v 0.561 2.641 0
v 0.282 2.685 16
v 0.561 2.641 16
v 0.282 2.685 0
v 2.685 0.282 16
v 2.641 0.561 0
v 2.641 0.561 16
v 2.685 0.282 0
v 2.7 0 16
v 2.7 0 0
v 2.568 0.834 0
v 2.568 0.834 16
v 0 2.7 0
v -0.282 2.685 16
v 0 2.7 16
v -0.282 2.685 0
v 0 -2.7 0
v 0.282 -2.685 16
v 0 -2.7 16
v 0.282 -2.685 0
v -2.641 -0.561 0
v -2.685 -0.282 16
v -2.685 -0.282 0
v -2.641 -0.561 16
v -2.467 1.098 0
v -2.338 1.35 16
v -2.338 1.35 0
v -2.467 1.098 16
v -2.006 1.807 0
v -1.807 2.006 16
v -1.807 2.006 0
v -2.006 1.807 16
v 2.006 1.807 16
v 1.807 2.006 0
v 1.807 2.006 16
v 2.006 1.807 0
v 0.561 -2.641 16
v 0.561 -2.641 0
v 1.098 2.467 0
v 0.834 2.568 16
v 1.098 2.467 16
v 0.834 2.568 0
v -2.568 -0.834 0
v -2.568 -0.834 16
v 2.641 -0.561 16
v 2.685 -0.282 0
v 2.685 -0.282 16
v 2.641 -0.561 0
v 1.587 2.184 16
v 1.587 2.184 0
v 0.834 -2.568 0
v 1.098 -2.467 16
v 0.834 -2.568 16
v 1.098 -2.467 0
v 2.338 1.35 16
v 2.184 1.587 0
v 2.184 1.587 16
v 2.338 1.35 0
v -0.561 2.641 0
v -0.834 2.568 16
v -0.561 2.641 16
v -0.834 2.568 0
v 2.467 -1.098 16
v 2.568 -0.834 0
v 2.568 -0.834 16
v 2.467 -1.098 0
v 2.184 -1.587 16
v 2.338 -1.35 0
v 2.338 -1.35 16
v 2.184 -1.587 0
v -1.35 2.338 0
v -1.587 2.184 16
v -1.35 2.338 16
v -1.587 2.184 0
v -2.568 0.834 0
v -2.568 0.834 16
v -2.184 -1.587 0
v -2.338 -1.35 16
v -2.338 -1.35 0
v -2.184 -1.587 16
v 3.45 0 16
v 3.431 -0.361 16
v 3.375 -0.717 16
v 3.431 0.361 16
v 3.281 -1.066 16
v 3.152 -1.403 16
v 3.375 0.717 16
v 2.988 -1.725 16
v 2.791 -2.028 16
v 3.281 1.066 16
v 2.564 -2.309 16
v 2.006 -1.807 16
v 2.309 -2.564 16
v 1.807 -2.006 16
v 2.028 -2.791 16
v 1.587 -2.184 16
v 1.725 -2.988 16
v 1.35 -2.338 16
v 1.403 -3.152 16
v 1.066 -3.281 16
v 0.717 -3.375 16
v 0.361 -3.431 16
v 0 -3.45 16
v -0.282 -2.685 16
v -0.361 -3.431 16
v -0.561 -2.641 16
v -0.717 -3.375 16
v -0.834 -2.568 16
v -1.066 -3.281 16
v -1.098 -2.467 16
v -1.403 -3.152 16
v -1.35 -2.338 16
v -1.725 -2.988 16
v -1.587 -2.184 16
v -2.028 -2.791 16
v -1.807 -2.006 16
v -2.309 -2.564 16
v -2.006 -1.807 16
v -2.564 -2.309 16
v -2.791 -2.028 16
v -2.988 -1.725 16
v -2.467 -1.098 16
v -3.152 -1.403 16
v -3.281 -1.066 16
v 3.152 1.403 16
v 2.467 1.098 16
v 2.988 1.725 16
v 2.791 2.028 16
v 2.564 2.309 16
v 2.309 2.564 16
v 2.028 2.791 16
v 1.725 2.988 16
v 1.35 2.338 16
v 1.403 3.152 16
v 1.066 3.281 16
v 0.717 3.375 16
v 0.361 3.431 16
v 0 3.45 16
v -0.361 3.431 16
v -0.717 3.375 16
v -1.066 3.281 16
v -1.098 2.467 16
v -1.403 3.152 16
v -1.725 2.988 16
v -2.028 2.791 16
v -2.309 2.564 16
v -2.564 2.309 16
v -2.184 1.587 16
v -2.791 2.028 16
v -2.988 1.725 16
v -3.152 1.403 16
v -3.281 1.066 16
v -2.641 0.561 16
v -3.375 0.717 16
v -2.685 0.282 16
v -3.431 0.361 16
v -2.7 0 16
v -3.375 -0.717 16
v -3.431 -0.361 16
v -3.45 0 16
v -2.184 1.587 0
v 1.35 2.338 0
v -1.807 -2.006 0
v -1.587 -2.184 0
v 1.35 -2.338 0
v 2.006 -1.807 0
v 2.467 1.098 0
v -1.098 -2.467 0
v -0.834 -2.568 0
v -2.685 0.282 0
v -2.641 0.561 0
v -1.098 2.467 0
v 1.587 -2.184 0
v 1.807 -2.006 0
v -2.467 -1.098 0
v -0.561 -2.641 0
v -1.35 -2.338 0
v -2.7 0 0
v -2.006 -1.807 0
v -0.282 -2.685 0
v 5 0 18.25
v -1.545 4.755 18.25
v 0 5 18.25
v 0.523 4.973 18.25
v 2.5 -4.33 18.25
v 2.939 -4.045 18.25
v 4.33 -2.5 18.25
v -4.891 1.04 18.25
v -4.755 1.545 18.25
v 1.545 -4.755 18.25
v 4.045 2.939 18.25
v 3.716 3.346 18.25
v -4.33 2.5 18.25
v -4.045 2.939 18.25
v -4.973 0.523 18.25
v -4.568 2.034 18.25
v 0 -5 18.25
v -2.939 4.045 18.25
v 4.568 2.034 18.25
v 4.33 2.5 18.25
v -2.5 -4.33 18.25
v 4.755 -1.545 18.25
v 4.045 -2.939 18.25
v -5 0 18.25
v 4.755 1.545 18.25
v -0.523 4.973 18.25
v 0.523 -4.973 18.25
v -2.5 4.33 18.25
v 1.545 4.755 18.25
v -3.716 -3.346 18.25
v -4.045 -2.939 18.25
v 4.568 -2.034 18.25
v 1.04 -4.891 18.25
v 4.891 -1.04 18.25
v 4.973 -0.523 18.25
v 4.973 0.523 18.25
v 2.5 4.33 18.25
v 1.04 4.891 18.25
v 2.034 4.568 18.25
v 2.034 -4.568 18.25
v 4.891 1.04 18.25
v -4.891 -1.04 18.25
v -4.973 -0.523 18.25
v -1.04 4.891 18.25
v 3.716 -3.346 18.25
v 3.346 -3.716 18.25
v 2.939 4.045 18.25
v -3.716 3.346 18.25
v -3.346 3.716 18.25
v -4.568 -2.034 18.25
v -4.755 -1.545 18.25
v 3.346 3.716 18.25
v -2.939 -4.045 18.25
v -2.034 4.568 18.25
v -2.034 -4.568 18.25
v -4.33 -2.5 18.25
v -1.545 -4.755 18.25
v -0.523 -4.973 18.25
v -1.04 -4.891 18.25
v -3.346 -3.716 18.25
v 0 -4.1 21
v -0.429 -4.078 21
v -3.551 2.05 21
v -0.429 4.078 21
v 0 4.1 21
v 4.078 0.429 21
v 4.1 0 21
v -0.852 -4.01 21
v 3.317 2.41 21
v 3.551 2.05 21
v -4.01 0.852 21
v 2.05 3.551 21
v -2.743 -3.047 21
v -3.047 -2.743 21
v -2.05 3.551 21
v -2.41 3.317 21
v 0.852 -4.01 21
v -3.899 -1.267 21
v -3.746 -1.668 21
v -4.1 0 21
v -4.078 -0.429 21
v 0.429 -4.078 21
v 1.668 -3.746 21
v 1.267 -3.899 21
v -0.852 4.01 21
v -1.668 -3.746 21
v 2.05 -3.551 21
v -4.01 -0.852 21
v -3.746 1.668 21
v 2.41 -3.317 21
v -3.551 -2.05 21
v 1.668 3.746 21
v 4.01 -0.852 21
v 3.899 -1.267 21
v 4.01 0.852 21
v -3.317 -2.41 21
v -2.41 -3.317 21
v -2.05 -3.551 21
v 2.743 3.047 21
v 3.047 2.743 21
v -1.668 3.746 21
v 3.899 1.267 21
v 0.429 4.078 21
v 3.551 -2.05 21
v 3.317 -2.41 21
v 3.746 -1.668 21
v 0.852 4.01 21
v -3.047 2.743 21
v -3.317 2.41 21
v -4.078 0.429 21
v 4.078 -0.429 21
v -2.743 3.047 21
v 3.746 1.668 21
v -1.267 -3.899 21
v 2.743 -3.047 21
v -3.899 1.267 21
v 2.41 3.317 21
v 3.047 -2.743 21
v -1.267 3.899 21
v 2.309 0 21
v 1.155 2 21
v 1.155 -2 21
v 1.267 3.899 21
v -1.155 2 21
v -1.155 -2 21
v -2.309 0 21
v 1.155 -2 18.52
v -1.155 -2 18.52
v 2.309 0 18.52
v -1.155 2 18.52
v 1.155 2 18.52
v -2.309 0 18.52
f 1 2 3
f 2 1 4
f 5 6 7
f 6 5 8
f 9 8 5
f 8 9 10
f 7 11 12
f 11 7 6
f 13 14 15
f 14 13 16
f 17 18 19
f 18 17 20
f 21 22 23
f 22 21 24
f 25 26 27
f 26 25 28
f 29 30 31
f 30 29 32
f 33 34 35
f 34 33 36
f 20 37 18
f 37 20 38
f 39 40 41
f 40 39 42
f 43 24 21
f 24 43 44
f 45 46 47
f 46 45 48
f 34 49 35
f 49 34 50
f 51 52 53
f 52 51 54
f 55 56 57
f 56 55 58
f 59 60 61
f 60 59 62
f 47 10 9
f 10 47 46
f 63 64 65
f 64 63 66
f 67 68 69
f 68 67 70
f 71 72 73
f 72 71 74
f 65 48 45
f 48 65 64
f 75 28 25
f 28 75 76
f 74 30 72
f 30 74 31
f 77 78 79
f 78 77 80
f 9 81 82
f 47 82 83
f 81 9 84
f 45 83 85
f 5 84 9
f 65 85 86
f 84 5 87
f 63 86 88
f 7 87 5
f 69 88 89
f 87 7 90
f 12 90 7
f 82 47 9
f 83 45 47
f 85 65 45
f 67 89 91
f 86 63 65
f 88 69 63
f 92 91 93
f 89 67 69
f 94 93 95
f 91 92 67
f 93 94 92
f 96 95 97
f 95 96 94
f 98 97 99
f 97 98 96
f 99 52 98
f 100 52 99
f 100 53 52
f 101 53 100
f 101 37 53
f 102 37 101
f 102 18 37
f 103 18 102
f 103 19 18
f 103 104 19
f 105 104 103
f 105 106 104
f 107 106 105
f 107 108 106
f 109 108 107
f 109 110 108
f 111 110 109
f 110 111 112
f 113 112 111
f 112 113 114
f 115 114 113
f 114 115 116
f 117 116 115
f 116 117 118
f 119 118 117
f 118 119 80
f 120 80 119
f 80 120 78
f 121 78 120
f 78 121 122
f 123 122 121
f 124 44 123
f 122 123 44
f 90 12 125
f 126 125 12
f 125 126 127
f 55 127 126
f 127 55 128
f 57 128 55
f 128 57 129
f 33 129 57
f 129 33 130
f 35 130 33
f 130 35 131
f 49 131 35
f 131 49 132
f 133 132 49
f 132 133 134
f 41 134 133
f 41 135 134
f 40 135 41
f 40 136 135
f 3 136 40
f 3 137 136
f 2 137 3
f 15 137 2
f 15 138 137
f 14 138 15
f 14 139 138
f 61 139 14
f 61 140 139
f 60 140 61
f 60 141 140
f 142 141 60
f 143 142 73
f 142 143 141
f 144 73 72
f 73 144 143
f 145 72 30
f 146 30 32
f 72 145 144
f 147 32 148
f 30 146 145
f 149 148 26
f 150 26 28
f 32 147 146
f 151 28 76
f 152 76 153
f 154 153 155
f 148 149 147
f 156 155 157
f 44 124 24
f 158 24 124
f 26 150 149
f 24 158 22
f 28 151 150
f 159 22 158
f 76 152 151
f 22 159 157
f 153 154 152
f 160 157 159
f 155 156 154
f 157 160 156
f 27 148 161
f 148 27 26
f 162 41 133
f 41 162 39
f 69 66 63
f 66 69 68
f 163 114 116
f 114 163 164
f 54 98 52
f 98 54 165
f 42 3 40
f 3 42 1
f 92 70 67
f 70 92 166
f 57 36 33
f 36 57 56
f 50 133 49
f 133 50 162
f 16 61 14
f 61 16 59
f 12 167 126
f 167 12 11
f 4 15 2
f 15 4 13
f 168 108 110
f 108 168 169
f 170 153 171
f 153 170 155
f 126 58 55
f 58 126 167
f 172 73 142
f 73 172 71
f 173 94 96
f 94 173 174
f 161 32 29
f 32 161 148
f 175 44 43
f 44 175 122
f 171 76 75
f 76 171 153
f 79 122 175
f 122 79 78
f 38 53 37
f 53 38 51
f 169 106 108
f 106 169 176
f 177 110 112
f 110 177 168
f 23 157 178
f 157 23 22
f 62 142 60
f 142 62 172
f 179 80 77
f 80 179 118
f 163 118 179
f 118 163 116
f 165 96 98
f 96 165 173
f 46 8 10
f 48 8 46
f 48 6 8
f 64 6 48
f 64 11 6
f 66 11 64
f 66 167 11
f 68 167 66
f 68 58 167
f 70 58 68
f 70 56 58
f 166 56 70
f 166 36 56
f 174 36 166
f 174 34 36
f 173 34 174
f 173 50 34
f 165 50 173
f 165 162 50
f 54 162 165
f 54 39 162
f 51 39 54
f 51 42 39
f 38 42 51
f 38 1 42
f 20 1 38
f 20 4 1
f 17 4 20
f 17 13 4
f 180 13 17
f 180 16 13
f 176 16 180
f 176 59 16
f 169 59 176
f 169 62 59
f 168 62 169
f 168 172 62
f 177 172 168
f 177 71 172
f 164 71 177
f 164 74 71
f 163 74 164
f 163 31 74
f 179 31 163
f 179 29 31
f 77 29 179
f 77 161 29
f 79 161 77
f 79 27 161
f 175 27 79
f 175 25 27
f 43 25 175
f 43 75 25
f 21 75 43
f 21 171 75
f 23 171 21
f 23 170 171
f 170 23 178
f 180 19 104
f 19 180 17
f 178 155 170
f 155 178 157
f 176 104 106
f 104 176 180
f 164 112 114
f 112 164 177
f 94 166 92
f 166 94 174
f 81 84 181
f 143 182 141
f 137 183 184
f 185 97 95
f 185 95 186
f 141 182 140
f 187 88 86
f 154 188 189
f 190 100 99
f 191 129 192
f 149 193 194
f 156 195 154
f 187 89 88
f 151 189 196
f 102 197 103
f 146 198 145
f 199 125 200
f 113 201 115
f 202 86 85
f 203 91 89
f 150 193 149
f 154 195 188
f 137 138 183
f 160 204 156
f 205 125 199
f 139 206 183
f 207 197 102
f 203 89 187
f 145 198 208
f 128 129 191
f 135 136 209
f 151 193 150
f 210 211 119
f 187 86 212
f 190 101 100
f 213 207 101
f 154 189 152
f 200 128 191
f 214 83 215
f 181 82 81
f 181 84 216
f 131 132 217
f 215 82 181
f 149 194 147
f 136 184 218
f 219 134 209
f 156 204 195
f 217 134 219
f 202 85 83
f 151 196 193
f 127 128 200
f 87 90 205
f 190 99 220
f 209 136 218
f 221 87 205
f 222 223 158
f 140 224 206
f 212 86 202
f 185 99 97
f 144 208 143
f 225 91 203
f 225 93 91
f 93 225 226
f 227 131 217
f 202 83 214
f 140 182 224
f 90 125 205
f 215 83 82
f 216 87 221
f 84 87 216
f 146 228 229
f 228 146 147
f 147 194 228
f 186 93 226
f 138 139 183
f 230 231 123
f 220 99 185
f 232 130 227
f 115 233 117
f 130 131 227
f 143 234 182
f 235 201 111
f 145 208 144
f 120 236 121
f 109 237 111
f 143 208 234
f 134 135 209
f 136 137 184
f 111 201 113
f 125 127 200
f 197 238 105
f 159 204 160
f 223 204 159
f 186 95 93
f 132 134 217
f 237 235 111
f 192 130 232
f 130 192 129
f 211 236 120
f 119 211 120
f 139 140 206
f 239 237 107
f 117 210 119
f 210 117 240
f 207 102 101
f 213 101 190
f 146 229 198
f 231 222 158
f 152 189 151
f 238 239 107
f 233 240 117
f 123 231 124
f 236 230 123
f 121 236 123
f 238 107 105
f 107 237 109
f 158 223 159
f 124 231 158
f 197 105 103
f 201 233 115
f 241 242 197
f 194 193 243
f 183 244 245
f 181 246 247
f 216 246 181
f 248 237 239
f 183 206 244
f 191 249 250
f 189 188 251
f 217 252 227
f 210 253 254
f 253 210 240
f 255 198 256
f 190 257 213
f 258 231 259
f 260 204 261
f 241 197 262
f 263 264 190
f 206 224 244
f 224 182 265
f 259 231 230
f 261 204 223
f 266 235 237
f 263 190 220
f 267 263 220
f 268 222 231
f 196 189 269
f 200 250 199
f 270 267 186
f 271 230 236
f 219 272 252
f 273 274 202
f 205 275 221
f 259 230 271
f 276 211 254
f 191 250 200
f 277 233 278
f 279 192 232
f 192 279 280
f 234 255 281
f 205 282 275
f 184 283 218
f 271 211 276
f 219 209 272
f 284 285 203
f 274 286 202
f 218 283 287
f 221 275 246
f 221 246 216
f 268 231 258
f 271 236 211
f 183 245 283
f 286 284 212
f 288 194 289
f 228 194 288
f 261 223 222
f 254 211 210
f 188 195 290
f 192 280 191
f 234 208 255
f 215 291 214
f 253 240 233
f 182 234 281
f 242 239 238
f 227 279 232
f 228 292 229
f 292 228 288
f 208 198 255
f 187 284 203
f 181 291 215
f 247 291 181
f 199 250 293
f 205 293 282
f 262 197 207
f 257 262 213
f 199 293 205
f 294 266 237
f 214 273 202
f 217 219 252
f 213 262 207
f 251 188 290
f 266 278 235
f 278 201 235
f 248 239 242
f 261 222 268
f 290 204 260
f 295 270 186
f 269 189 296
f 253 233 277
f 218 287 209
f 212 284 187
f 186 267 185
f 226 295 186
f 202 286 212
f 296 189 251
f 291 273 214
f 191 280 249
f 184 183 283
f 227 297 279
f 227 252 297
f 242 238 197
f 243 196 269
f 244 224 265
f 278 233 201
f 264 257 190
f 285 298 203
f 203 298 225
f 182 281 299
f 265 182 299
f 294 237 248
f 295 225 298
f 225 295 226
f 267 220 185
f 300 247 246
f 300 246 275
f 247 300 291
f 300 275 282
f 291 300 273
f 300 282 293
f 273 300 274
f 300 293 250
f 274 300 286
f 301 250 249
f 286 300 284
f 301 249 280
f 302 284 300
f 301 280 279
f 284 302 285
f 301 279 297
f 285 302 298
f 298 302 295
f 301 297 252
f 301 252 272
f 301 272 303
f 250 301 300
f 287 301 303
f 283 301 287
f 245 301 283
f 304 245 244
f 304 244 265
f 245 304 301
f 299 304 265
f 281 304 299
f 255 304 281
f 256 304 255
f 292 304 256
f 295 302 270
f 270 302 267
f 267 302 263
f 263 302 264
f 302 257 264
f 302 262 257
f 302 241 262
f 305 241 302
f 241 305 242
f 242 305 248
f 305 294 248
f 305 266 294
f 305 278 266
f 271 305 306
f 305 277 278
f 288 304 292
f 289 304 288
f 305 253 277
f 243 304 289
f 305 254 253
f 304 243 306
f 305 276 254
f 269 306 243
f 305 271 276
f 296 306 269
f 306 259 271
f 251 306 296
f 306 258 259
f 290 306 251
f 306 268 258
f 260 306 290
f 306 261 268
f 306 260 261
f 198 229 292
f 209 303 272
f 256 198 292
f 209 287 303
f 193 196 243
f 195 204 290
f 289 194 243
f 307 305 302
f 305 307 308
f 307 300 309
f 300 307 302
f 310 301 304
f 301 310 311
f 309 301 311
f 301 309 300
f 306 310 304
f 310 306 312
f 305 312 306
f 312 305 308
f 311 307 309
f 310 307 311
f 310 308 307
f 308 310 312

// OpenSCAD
// Low-profile button-head screw.
$fn = 60;
eps = 0.02;
shaft_d = 5.4;
head_d = 10;
head_h = 5;
shaft_l = 16;
socket_flat = head_d * 0.40;
difference() {
    union() {
        cylinder(d = shaft_d, h = shaft_l);
        translate([0, 0, shaft_l]) cylinder(d1 = shaft_d + 1.5, d2 = head_d, h = head_h * 0.45);
        translate([0, 0, shaft_l + head_h * 0.45]) cylinder(d1 = head_d, d2 = head_d * 0.82, h = head_h * 0.55);
    }
    translate([0, 0, shaft_l + head_h - head_h * 0.5 + eps])
        cylinder(d = socket_flat / cos(30), h = head_h * 0.5 + eps, $fn = 6);
}
